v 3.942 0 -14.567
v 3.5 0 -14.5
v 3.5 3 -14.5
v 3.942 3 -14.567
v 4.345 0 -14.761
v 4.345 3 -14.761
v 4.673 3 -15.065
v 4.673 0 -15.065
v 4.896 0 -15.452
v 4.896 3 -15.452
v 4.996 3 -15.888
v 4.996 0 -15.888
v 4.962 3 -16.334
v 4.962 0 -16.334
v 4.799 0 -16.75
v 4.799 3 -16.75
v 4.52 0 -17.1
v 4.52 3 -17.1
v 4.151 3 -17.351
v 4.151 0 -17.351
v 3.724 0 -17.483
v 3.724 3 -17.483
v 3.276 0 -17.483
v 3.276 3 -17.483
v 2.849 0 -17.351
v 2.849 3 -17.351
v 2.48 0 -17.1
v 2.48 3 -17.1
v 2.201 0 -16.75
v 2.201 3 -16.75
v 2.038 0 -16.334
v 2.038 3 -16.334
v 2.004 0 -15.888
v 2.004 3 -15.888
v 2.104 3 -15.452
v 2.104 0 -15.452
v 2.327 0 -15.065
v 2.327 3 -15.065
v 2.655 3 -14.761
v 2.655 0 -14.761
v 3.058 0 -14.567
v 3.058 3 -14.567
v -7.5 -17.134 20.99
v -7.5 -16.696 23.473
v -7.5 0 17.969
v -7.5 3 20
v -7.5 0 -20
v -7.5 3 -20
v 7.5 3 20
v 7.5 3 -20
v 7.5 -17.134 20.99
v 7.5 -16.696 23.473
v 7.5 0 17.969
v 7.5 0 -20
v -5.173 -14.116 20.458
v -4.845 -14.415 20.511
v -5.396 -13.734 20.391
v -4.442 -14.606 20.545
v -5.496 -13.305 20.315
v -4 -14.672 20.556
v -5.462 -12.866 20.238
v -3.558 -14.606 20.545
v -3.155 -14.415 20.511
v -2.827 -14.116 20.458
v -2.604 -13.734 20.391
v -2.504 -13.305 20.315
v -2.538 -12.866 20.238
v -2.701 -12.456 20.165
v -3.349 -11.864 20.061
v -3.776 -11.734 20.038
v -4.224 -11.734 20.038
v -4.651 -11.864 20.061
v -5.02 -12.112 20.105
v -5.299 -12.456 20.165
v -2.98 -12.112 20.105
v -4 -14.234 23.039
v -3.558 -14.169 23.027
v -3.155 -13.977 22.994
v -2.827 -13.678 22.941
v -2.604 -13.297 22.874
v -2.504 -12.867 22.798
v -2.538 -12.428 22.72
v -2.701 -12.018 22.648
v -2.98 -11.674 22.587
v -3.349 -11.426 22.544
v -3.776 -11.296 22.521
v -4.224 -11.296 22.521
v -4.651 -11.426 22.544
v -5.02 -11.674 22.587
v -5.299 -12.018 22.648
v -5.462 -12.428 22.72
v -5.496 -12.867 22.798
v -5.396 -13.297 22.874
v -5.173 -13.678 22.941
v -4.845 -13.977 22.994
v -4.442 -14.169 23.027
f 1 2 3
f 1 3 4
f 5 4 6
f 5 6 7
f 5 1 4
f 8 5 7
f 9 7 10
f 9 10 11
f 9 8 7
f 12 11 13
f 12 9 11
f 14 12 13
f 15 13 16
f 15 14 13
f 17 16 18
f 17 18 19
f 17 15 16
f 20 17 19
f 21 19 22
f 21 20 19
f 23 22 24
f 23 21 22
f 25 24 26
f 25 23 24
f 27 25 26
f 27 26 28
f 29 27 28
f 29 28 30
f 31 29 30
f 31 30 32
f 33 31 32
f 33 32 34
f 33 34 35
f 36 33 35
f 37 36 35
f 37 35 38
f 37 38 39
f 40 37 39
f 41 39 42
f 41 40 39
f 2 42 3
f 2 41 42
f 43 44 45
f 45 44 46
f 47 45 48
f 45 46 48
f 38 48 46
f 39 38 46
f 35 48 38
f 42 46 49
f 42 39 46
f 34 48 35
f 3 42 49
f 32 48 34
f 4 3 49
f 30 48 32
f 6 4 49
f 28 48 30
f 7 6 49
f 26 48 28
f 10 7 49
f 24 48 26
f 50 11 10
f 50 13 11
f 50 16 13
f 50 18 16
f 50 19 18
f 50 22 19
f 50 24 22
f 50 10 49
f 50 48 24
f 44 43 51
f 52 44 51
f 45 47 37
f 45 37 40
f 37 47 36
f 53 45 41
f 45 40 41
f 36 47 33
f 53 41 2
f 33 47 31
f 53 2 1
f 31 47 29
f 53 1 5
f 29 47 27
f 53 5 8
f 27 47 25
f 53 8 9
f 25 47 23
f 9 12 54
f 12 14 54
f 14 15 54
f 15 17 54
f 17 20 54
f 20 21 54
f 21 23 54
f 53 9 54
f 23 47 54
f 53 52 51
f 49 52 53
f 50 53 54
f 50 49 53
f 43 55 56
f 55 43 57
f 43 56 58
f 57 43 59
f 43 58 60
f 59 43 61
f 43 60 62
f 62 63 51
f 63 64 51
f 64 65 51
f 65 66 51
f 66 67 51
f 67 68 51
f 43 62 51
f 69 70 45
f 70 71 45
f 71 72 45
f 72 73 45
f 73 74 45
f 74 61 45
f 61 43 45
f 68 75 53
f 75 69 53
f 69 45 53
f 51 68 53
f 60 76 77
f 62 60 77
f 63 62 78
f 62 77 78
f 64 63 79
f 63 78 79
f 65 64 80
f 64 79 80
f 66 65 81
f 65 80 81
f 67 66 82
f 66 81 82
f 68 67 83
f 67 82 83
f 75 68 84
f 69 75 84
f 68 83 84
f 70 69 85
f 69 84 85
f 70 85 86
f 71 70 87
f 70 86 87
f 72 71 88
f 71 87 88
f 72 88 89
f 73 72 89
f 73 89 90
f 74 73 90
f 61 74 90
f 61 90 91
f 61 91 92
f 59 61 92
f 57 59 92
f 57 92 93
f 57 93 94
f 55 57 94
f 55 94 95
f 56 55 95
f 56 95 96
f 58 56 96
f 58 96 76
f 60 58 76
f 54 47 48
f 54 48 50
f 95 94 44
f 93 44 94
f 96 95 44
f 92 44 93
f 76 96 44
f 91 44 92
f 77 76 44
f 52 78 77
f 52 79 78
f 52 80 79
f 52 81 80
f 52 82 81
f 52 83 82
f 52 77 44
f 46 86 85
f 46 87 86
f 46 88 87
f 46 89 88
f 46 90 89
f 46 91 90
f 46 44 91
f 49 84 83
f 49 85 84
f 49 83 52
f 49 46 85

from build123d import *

# Parameters (mm, degrees)
SKETCH1_W           = 15
SKETCH1_H           = 40
SKETCH1_R           = 1.5
BOSS_EXTRUDE1_DEPTH = 3
SKETCH2_W           = 15
SKETCH2_H           = 2.520944533
BOSS_EXTRUDE2_DEPTH = 20
SKETCH3_R           = 1.5
CUT_EXTRUDE1_DEPTH  = 10


with BuildPart() as part:
    # Sketch1 → Boss-Extrude1 (new body)
    with BuildSketch(Plane(origin=(0, 0, 0), x_dir=(1, 0, 0), z_dir=(0, 1, 0))):
        Rectangle(SKETCH1_W, SKETCH1_H)
        with Locations(Location((3.5, 16, 0), (0, 0, 270))):
            Circle(SKETCH1_R, mode=Mode.SUBTRACT)
    extrude(amount=BOSS_EXTRUDE1_DEPTH)

    # Sketch2 → Boss-Extrude2 (add)
    with BuildSketch(Plane(origin=(0, -0.510662502, 0.090043577), x_dir=(1, 0, 0), z_dir=(0, 0.9848077530122075, -0.17364817766693402))):
        with Locations((0, -18.956627327)):
            Rectangle(SKETCH2_W, SKETCH2_H)
    extrude(amount=-BOSS_EXTRUDE2_DEPTH)

    # Sketch3 → Cut-Extrude1 (cut)
    with BuildSketch(Plane(origin=(0, 3.510662502, 19.909956423), x_dir=(1, 0, 0), z_dir=(0, 0.173648177666934, 0.9848077530122075))):
        with Locations(Location((-4, -16.518540294, 0), (0, 0, 270))):
            Circle(SKETCH3_R)
    extrude(amount=-CUT_EXTRUDE1_DEPTH, mode=Mode.SUBTRACT)


solid = part.part
